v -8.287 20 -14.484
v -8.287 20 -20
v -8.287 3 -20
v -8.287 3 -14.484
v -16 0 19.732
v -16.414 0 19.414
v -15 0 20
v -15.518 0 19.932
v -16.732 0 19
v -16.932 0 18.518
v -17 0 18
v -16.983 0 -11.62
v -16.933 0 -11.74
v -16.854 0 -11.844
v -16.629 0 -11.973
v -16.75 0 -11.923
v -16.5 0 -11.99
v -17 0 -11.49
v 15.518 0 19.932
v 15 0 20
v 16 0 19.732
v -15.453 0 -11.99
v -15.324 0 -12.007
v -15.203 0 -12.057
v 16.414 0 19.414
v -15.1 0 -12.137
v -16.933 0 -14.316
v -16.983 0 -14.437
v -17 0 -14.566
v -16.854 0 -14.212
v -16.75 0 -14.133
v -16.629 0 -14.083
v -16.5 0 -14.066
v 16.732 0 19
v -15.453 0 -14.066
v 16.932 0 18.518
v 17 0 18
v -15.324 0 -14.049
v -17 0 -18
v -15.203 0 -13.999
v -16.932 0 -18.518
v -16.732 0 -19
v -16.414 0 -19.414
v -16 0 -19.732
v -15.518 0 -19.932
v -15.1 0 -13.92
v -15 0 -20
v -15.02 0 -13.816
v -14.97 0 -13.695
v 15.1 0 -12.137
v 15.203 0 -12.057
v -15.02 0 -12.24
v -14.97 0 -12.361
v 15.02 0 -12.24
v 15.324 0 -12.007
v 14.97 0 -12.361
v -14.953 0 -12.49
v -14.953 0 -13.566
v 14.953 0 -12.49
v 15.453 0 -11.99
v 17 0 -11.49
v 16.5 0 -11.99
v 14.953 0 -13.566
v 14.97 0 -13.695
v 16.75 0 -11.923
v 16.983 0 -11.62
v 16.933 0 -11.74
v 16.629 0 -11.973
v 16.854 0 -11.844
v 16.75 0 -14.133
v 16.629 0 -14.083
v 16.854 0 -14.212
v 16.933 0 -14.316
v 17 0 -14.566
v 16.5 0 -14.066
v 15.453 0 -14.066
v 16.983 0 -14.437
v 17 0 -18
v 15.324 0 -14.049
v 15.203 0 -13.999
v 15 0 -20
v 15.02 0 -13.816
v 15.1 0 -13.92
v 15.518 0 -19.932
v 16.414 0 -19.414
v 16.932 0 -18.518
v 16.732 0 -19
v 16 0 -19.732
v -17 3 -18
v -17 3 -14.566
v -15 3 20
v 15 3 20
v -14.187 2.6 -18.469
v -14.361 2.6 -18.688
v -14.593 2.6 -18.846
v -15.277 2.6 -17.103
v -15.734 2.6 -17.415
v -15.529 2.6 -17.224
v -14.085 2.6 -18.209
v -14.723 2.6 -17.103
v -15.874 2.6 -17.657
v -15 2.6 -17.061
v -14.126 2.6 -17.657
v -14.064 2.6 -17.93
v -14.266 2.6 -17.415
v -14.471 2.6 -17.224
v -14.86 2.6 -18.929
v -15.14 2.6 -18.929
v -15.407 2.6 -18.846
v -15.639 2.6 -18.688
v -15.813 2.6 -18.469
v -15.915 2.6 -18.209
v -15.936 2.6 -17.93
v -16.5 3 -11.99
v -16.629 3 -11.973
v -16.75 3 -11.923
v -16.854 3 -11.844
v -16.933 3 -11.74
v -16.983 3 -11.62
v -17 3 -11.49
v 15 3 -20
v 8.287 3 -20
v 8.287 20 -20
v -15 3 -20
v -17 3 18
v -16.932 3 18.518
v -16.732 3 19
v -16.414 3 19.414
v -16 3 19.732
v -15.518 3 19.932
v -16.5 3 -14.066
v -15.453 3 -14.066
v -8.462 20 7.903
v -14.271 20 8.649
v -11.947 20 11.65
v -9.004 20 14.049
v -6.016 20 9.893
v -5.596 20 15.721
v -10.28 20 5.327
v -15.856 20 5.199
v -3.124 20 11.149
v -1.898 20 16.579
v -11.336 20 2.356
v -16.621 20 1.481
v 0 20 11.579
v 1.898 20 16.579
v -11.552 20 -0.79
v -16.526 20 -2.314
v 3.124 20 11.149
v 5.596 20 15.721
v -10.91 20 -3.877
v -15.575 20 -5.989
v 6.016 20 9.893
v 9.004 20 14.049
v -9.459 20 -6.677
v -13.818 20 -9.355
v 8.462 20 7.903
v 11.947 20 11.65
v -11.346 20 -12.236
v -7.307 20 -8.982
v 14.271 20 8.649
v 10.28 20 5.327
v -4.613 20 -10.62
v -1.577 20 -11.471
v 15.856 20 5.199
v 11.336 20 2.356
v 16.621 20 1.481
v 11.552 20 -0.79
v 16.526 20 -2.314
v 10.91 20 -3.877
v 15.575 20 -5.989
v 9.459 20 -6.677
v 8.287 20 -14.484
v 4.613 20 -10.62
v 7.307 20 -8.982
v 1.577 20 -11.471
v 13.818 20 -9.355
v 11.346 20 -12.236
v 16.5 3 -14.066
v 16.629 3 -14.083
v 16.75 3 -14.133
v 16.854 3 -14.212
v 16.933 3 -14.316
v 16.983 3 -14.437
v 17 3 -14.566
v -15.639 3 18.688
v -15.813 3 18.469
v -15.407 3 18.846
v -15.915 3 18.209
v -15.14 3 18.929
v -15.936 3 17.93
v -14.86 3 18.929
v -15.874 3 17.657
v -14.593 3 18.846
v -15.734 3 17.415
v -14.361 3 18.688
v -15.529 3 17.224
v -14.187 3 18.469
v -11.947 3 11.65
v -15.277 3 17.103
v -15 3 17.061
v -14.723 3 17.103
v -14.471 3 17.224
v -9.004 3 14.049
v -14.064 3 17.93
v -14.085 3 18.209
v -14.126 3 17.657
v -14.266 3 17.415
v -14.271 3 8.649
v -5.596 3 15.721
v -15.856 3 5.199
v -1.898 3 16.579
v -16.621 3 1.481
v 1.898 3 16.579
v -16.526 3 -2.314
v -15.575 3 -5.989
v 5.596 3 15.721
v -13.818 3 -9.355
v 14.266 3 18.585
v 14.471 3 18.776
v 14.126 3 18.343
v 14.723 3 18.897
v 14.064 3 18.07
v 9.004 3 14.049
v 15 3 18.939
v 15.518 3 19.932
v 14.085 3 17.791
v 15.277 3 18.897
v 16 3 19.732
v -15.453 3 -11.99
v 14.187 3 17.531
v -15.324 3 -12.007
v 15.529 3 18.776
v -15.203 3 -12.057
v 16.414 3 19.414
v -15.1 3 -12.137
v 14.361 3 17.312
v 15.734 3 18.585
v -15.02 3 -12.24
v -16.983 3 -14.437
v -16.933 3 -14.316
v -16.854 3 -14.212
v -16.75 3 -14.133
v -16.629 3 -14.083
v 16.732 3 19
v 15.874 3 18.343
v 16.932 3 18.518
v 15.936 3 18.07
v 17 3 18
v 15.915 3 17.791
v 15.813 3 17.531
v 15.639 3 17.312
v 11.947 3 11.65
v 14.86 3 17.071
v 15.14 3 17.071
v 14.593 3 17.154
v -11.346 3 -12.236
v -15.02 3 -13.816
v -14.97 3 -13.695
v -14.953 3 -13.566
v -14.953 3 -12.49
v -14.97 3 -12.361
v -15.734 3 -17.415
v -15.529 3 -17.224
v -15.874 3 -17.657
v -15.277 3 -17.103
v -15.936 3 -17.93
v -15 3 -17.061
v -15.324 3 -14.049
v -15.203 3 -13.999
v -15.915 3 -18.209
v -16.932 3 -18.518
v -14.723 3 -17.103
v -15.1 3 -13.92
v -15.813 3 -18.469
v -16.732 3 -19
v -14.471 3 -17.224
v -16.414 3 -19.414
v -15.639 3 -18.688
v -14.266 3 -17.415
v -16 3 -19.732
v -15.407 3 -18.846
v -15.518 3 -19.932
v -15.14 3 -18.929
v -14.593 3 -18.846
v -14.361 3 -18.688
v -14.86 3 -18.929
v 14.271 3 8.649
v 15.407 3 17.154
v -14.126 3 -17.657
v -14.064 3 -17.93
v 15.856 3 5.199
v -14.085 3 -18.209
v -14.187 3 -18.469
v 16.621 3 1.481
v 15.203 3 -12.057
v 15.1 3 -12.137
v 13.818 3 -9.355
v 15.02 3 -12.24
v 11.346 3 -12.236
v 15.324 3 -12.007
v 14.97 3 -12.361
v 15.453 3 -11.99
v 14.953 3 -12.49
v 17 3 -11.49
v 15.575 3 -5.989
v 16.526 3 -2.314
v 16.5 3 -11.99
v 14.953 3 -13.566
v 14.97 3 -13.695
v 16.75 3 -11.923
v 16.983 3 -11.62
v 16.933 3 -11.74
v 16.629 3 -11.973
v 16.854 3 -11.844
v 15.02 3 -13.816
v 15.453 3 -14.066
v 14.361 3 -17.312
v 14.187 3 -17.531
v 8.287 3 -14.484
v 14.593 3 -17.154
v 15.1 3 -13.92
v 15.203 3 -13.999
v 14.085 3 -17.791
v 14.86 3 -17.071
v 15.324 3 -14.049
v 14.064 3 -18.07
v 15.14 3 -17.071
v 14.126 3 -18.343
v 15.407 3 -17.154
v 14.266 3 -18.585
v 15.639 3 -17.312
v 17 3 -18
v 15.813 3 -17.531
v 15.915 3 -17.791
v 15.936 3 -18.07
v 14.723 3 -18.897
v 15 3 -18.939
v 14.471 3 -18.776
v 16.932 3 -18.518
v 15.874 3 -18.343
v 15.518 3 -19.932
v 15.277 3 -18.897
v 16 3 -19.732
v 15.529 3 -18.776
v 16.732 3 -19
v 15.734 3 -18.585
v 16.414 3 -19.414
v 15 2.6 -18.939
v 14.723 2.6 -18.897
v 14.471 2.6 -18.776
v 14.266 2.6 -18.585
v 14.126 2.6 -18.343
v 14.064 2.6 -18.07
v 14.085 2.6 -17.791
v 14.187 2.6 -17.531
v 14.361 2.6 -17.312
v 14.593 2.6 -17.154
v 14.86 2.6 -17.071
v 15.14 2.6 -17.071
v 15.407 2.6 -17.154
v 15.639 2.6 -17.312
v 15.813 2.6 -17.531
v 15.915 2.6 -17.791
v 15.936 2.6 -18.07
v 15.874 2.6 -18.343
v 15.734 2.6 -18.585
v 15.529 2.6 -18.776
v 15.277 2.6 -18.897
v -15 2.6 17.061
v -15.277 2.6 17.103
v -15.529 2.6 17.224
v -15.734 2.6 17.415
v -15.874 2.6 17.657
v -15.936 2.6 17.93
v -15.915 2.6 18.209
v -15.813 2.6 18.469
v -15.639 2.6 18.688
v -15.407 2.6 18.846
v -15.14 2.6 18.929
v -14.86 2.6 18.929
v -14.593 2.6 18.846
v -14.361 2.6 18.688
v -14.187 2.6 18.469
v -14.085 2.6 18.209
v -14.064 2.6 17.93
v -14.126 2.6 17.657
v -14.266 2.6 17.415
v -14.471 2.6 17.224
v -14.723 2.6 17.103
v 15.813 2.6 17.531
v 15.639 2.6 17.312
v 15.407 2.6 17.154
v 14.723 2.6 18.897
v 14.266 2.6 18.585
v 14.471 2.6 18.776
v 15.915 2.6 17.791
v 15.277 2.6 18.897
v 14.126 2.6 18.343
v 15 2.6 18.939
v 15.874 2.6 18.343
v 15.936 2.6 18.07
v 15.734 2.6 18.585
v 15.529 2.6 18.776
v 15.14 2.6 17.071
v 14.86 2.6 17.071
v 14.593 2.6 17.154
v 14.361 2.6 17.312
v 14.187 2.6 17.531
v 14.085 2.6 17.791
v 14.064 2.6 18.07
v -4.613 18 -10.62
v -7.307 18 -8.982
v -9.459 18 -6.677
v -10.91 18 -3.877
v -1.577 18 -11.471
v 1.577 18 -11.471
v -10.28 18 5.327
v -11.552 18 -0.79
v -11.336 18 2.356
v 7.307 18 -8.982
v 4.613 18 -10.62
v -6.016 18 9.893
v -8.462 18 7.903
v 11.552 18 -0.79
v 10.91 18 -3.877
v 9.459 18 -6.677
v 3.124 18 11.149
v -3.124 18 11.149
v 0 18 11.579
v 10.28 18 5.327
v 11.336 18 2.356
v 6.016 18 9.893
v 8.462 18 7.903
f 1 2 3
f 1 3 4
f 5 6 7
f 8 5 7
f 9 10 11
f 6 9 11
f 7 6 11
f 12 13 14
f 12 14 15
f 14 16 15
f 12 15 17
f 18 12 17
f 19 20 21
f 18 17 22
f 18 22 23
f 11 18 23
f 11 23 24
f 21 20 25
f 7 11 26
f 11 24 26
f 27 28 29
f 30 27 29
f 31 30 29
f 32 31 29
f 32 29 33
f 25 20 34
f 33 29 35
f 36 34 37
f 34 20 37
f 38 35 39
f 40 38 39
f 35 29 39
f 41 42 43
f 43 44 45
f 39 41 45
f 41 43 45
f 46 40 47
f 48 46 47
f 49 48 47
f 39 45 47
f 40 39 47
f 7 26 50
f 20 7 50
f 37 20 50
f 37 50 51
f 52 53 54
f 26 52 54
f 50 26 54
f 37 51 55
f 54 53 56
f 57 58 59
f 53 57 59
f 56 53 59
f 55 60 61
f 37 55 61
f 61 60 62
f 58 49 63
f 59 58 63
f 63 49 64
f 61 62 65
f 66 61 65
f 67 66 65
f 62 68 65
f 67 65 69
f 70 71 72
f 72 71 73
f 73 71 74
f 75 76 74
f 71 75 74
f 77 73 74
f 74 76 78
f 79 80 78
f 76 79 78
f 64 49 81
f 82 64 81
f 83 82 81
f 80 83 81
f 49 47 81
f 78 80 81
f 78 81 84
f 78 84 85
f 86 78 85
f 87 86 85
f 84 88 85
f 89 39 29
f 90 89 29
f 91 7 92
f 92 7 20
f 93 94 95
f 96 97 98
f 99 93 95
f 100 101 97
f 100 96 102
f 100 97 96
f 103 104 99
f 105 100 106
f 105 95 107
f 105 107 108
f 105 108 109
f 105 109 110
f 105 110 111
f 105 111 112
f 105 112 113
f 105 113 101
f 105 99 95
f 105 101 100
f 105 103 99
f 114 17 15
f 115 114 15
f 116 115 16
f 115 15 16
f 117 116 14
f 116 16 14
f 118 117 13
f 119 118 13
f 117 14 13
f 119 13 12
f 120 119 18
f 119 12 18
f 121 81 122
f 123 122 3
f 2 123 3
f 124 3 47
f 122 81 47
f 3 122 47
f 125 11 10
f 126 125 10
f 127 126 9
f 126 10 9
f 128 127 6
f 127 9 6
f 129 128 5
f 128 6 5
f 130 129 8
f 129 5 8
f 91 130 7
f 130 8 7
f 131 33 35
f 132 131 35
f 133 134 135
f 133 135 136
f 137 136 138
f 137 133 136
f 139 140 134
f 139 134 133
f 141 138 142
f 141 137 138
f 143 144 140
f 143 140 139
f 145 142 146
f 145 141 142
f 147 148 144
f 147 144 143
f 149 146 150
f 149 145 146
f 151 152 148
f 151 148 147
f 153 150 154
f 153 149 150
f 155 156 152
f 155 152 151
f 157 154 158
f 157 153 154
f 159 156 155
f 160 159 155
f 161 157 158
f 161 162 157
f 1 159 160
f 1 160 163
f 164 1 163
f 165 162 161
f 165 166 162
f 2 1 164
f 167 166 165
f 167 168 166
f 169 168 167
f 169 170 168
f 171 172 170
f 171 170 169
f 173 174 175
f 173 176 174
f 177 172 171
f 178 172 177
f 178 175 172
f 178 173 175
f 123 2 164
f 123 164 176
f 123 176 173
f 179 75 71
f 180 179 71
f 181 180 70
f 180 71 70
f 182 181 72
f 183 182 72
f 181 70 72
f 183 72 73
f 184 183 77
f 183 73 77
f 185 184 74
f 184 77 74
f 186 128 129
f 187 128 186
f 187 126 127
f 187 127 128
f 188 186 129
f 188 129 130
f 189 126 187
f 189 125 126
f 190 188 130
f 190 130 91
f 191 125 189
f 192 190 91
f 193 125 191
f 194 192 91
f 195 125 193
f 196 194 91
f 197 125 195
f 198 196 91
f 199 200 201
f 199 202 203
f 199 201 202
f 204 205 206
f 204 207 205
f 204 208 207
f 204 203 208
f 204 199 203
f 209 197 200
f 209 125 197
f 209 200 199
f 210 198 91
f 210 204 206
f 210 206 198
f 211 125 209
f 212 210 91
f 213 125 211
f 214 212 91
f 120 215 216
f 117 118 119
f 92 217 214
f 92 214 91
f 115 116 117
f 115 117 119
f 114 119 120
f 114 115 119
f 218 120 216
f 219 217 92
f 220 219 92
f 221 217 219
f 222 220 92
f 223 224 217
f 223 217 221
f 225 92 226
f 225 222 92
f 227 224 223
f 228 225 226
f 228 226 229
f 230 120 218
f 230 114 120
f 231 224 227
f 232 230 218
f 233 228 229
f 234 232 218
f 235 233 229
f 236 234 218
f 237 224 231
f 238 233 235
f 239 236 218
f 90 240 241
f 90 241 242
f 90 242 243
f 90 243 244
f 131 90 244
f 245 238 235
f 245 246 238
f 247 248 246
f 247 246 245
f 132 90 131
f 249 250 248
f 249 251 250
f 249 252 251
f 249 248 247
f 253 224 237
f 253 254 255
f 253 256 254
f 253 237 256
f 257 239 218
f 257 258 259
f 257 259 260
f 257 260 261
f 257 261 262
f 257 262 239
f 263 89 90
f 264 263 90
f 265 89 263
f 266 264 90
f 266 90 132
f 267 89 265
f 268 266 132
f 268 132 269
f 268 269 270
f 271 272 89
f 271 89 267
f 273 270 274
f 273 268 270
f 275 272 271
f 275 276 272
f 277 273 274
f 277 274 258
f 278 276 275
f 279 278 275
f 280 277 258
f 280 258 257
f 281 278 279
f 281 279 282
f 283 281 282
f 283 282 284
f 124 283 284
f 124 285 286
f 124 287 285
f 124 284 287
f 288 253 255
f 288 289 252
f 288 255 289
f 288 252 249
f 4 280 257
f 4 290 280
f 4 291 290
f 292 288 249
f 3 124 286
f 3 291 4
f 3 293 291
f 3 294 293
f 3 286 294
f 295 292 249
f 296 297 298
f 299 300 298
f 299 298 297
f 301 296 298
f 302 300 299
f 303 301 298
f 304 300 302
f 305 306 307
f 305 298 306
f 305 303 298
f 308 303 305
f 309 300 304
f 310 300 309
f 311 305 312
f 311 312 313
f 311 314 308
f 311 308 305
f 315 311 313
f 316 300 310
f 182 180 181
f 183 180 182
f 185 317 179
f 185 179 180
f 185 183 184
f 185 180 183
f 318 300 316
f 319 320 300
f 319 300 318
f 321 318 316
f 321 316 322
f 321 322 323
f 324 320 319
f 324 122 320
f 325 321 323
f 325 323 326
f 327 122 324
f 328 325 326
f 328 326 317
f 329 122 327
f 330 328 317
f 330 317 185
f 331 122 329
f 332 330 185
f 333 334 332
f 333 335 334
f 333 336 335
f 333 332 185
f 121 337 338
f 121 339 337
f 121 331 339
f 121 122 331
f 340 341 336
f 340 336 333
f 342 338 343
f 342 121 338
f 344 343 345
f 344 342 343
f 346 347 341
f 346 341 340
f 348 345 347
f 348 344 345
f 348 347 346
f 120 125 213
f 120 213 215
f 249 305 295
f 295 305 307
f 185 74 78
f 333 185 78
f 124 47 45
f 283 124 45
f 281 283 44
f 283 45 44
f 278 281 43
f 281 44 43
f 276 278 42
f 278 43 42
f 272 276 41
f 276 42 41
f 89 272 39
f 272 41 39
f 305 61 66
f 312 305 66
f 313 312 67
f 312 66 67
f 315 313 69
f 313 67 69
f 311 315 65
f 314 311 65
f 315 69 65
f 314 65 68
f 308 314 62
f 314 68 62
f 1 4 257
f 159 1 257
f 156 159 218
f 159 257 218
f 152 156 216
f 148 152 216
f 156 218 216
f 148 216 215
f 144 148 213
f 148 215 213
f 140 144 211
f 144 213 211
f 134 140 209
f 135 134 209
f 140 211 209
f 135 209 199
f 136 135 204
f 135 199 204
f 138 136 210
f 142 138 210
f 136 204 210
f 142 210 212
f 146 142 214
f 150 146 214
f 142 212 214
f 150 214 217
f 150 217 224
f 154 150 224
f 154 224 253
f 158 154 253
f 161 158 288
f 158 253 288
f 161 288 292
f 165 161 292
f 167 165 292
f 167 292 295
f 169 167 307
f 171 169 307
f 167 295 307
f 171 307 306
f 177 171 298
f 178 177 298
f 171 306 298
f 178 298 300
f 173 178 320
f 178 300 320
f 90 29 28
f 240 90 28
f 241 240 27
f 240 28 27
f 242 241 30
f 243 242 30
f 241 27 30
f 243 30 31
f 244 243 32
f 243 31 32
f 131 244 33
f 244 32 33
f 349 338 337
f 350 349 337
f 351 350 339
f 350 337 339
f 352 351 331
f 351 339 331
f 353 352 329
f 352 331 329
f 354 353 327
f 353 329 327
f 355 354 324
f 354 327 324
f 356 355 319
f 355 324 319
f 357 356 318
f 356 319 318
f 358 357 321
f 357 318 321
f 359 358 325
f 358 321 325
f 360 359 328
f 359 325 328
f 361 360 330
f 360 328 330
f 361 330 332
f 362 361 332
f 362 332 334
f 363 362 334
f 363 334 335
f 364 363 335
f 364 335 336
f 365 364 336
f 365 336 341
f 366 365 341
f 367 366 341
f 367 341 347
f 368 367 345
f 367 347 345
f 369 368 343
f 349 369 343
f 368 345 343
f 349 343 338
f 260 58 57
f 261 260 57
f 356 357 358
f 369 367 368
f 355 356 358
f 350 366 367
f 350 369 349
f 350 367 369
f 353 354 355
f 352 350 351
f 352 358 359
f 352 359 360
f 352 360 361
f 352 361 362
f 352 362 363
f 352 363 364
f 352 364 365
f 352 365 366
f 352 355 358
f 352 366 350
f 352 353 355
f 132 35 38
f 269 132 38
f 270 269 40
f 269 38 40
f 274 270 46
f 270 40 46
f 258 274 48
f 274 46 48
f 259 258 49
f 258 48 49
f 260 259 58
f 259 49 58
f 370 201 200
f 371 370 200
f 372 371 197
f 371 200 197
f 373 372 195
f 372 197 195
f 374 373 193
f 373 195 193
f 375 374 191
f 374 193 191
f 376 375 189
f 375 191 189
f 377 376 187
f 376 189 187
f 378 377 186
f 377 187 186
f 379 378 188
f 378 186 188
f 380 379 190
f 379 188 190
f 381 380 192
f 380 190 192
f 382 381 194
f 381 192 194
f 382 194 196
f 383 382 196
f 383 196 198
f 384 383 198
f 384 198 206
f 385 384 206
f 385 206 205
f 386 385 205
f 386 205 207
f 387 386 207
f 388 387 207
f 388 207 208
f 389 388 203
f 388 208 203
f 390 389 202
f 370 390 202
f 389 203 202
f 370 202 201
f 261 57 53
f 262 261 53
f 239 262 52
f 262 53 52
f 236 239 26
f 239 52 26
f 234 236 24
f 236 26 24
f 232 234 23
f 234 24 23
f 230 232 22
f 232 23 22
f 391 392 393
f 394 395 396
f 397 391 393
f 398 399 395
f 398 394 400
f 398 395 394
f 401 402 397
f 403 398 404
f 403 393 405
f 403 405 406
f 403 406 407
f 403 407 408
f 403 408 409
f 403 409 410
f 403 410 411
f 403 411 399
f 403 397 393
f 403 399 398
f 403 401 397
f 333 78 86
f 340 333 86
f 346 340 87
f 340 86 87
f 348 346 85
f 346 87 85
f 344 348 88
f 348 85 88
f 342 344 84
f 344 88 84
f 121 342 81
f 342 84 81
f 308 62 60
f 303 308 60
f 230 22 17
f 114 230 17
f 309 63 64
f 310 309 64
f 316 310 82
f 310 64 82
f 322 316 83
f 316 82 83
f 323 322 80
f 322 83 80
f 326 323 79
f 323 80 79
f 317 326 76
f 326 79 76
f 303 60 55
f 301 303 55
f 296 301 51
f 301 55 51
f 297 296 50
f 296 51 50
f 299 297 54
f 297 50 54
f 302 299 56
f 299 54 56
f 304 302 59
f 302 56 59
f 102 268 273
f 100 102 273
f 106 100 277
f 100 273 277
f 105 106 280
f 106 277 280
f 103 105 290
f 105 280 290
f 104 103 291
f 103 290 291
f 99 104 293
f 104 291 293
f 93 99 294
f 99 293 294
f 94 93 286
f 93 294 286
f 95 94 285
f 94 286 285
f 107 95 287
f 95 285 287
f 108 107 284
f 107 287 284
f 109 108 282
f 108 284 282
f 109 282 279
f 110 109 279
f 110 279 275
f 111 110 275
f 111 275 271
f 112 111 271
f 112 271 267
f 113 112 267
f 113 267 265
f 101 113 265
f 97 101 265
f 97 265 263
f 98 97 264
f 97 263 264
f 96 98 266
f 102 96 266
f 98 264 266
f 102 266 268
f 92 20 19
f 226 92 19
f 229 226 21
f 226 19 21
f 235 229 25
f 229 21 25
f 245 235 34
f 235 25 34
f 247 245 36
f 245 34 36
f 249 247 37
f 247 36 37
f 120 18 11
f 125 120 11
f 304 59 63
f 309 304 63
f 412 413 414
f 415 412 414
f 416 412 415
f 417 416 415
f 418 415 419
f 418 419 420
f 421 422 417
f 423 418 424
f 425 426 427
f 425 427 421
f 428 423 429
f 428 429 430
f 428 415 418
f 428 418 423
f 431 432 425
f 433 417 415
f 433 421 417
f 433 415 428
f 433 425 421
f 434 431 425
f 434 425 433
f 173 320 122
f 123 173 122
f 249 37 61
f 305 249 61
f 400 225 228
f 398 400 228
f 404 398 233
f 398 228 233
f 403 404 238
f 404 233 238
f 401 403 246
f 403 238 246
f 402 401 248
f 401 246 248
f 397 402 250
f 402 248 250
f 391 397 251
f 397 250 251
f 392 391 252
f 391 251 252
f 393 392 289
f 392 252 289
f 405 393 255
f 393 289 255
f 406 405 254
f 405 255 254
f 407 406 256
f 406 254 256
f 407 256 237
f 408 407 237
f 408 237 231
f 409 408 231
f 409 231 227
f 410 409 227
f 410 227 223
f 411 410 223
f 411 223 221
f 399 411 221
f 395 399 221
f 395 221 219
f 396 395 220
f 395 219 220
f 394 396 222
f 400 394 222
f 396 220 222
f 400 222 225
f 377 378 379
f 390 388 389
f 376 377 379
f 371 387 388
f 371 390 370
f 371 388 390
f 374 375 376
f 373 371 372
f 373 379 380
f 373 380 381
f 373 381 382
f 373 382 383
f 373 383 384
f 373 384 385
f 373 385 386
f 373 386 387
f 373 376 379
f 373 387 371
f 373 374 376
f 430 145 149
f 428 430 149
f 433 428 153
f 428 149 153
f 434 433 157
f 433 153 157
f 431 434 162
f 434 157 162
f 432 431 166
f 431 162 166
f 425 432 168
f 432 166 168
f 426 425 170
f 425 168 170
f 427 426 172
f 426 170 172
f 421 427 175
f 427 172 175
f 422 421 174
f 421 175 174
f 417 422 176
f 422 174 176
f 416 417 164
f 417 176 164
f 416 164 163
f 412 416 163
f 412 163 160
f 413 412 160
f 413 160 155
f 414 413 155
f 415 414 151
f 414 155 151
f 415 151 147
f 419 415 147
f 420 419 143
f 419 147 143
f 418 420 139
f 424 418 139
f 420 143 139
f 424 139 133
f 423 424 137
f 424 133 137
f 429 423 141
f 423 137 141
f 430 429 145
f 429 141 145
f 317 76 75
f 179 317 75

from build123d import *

# Parameters (mm, degrees)
BOSS_EXTRUDE1_DEPTH = 3
SKETCH2_R           = 0.938992972
CUT_EXTRUDE1_DEPTH  = 0.4
BOSS_EXTRUDE2_DEPTH = 17
SKETCH5_R           = 11.578602023
CUT_EXTRUDE2_DEPTH  = 2


with BuildPart() as part:
    # Sketch1 → Boss-Extrude1 (new body)
    with BuildSketch(Plane(origin=(0, 0, 0), x_dir=(1, 0, 0), z_dir=(0, 1, 0))):
        with BuildLine():
            Line((-16.5, 14.065984754), (-15.453193913, 14.065984754))
            ThreePointArc((-15.453193913, 14.065984754), (-15.099640522, 13.919538145), (-14.953193913, 13.565984754))
            Line((-14.953193913, 13.565984754), (-14.953193913, 12.490105557))
            ThreePointArc((-14.953193913, 12.490105557), (-15.099640522, 12.136552166), (-15.453193913, 11.990105557))
            Line((-15.453193913, 11.990105557), (-16.5, 11.990105557))
            ThreePointArc((-16.5, 11.990105557), (-16.853553391, 11.843658947), (-17, 11.490105557))
            Line((-17, 11.490105557), (-17, -18))
            ThreePointArc((-17, -18), (-16.414213562, -19.414213562), (-15, -20))
            Line((-15, -20), (15, -20))
            ThreePointArc((15, -20), (16.414213562, -19.414213562), (17, -18))
            Line((17, -18), (17, 11.490105557))
            ThreePointArc((17, 11.490105557), (16.853553391, 11.843658947), (16.5, 11.990105557))
            Line((16.5, 11.990105557), (15.453193913, 11.990105557))
            ThreePointArc((15.453193913, 11.990105557), (15.099640522, 12.136552166), (14.953193913, 12.490105557))
            Line((14.953193913, 12.490105557), (14.953193913, 13.565984754))
            ThreePointArc((14.953193913, 13.565984754), (15.099640522, 13.919538145), (15.453193913, 14.065984754))
            Line((15.453193913, 14.065984754), (16.5, 14.065984754))
            ThreePointArc((16.5, 14.065984754), (16.853553391, 14.212431364), (17, 14.565984754))
            Line((17, 14.565984754), (17, 18))
            ThreePointArc((17, 18), (16.414213562, 19.414213562), (15, 20))
            Line((15, 20), (-15, 20))
            ThreePointArc((-15, 20), (-16.414213562, 19.414213562), (-17, 18))
            Line((-17, 18), (-17, 14.565984754))
            ThreePointArc((-17, 14.565984754), (-16.853553391, 14.212431364), (-16.5, 14.065984754))
        make_face()
    extrude(amount=BOSS_EXTRUDE1_DEPTH)

    # Sketch2 → Cut-Extrude1 (cut)
    with BuildSketch(Plane(origin=(0, 3, 0), x_dir=(1, 0, 0), z_dir=(0, 1, 0))):
        with Locations(Location((-15, 18, 0), (0, 0, 270))):
            Circle(SKETCH2_R)
        with Locations(Location((-15, -18, 0), (0, 0, 90))):
            Circle(SKETCH2_R)
        with Locations(Location((15, -18, 0), (0, 0, 270))):
            Circle(SKETCH2_R)
        with Locations(Location((15, 18, 0), (0, 0, 90))):
            Circle(SKETCH2_R)
    extrude(amount=-CUT_EXTRUDE1_DEPTH, mode=Mode.SUBTRACT)

    # Sketch4 → Boss-Extrude2 (add)
    with BuildSketch(Plane(origin=(0, 3, 0), x_dir=(1, 0, 0), z_dir=(0, 1, 0))):
        with BuildLine():
            Line((8.287121405, 14.483706302), (8.287121405, 20))
            Line((8.287121405, 20), (-8.287121405, 20))
            Line((-8.287121405, 20), (-8.287121405, 14.483706302))
            ThreePointArc((-8.287121405, 14.483706302), (0, -16.686944879), (8.287121405, 14.483706302))
        make_face()
    extrude(amount=BOSS_EXTRUDE2_DEPTH)

    # Sketch5 → Cut-Extrude2 (cut)
    with BuildSketch(Plane(origin=(0, 20, 0), x_dir=(1, 0, 0), z_dir=(0, 1, 0))):
        with Locations(Location((0, 0, 0), (0, 0, 270))):
            Circle(SKETCH5_R)
    extrude(amount=-CUT_EXTRUDE2_DEPTH, mode=Mode.SUBTRACT)


solid = part.part
